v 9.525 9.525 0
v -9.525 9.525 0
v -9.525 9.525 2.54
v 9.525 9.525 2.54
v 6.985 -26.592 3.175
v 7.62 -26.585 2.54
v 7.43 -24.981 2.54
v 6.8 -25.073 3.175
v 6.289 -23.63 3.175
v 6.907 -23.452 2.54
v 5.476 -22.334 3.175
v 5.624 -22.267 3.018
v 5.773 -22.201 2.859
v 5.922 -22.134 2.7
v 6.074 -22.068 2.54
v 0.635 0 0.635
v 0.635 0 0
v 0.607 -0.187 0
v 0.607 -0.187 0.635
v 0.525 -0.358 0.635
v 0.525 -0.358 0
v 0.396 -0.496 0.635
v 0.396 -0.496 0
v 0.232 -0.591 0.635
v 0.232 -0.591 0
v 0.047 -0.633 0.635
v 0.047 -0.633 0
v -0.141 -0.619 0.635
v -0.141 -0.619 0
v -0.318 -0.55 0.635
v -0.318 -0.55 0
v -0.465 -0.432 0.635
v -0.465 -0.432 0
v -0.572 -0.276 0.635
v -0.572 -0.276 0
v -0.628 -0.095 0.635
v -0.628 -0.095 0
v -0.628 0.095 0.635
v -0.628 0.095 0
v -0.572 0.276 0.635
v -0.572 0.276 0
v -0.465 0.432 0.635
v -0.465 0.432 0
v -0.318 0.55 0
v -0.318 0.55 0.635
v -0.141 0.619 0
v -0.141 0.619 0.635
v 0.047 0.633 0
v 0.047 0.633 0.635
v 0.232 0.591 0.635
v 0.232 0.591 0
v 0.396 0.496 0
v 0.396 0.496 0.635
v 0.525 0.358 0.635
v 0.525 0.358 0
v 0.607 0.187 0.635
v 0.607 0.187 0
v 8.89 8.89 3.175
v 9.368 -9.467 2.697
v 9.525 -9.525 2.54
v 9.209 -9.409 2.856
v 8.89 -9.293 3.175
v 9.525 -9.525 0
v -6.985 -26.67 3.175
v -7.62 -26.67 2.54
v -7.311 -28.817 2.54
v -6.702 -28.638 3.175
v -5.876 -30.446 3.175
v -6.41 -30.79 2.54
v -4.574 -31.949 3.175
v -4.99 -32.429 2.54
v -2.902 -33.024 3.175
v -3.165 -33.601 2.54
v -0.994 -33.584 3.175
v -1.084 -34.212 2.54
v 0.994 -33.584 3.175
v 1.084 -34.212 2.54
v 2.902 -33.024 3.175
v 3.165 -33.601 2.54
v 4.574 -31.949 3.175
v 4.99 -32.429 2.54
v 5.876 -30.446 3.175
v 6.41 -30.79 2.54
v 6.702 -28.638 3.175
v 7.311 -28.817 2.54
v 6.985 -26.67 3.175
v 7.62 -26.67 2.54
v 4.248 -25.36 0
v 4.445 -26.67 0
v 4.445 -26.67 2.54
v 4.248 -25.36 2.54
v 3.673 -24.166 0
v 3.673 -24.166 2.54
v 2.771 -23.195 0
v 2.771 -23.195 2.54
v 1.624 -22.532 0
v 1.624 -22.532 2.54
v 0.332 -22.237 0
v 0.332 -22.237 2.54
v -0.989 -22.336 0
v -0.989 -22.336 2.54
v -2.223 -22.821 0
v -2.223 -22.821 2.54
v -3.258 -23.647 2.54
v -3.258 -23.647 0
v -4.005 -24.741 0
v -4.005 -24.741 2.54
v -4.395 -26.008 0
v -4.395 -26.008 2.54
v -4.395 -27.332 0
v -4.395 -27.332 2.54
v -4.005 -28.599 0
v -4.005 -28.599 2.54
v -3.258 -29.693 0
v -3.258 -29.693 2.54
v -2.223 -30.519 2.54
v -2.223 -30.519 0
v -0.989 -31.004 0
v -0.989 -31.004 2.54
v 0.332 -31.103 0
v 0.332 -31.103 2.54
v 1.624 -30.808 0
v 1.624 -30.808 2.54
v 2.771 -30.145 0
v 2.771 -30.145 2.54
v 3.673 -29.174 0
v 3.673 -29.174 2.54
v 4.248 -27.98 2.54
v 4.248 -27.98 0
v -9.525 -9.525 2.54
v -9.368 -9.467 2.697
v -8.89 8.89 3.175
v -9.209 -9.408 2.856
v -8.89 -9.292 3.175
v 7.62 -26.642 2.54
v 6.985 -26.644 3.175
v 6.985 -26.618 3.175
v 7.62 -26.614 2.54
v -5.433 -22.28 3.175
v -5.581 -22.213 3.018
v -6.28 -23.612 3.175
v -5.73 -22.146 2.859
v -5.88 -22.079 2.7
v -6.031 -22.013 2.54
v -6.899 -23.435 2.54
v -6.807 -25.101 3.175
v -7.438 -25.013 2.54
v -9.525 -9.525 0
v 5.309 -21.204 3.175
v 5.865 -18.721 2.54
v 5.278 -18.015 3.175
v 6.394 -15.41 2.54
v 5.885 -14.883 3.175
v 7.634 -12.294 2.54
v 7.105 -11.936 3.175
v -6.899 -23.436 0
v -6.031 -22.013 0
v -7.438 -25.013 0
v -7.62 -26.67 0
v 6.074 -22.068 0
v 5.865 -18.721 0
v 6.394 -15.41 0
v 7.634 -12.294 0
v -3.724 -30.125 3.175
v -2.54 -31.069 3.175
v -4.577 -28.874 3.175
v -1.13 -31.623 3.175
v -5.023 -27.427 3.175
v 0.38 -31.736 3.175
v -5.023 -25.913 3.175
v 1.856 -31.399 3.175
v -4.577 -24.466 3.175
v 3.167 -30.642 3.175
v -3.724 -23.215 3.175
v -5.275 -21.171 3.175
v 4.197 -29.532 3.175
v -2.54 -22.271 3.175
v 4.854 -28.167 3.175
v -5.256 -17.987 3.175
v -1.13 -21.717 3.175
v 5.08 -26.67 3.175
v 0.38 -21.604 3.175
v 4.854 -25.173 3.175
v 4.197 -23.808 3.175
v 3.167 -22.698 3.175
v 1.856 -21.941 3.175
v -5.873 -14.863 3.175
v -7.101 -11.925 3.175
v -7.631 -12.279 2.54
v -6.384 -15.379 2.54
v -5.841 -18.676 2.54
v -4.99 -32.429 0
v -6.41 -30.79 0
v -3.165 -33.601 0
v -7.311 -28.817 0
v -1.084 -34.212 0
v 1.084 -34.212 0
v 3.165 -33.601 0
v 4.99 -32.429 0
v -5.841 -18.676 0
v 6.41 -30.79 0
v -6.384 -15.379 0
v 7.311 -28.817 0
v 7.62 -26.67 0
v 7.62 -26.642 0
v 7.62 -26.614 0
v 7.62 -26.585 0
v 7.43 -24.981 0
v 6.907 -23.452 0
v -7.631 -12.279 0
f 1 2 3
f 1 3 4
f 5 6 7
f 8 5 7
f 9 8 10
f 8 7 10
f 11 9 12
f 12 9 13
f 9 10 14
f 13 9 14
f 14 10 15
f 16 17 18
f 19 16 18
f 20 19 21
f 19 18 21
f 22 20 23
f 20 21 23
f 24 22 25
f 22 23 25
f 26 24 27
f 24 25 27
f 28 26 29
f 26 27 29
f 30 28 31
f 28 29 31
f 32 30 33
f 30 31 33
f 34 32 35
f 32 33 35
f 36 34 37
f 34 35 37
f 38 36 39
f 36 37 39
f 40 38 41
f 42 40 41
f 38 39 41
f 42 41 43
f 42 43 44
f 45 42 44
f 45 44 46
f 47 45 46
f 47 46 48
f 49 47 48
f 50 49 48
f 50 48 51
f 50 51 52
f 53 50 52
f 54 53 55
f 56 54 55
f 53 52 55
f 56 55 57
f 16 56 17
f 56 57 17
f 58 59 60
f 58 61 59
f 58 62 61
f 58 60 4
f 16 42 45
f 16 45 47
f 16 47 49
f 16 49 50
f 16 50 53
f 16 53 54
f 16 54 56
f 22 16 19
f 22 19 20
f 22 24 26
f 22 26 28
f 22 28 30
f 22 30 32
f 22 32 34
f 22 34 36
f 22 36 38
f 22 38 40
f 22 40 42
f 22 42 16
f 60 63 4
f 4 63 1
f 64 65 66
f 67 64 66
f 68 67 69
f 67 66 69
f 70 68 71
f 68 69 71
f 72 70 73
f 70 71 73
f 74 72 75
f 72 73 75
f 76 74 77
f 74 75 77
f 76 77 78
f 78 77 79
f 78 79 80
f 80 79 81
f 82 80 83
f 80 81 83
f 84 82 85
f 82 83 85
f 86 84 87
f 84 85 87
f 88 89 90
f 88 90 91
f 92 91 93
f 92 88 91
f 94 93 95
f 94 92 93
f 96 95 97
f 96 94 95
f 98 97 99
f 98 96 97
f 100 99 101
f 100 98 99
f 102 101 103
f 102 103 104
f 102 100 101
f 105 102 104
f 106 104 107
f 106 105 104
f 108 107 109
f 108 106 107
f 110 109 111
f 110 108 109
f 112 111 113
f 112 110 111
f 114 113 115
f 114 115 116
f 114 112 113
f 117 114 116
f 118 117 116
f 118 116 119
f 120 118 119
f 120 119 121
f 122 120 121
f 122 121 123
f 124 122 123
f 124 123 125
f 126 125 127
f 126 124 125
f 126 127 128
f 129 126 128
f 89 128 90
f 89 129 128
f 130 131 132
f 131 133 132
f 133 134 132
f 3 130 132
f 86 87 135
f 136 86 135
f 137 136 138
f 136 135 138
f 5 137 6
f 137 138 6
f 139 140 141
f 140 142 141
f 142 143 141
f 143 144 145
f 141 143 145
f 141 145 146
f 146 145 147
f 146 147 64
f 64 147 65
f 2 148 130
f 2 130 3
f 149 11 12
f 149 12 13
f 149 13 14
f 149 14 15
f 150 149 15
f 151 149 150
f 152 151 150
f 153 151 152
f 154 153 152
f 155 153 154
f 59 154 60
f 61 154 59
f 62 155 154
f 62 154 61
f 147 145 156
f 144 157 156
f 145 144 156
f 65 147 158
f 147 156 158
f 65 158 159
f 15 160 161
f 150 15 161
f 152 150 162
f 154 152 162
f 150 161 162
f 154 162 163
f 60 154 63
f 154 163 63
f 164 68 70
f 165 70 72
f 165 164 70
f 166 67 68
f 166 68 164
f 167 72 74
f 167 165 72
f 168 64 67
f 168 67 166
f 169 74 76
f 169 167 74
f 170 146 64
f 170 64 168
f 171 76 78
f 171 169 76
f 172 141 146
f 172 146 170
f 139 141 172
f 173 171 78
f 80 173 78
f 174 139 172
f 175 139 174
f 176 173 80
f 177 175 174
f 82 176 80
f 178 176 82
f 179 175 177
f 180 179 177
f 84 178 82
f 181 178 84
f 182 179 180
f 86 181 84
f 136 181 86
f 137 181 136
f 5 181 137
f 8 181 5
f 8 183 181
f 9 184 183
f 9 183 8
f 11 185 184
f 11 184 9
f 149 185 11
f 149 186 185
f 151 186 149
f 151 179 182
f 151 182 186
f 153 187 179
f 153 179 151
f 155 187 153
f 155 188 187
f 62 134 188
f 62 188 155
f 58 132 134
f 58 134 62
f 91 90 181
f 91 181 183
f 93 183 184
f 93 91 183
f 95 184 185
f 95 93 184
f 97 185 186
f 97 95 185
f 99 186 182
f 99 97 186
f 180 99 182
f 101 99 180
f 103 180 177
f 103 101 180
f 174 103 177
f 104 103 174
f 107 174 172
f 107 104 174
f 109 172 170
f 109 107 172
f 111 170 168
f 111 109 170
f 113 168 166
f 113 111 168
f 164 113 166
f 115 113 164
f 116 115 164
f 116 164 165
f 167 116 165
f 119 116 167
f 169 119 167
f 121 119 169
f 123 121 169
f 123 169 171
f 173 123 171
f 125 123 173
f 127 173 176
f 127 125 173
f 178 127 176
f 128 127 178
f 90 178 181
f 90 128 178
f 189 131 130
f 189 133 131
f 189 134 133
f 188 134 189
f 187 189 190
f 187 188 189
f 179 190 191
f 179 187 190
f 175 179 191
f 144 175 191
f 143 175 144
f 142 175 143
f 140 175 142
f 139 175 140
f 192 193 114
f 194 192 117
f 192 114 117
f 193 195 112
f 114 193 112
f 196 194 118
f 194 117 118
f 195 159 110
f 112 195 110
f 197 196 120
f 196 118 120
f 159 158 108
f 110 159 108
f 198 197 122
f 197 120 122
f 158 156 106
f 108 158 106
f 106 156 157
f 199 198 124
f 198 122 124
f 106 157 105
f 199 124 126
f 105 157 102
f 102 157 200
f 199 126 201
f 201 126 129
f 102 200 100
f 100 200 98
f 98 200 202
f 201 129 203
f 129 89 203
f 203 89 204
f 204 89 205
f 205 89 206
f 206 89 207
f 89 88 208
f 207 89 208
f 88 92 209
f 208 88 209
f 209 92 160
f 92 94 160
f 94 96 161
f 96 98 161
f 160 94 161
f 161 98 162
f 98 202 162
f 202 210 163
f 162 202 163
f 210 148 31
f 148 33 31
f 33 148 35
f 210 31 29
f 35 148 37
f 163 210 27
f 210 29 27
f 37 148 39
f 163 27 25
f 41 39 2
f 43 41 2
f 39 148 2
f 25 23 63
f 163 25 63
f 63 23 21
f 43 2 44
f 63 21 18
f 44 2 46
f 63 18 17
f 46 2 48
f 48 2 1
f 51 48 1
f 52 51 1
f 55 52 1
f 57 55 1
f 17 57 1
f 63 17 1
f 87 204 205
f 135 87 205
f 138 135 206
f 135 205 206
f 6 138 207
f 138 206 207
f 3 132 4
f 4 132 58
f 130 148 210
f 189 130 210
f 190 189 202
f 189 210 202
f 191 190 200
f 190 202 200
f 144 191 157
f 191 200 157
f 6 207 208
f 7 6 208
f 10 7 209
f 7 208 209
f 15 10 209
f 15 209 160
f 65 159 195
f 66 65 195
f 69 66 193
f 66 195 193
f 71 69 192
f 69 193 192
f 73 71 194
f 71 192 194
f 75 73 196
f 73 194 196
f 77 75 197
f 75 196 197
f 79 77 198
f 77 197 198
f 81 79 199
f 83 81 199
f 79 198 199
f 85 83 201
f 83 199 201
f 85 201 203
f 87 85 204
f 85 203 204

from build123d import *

# Parameters (mm, degrees)
F0_W       = 19.05
F0_H       = 19.05
F0_R       = 4.445
F1_DEPTH   = 3.175
F2_C1_SIZE = 0.635
F2_C2_SIZE = 0.635
F2_C3_SIZE = 0.635
F2_C4_SIZE = 0.635
F2_C5_SIZE = 0.635
F2_C6_SIZE = 0.635
F2_C7_SIZE = 0.6349
F3_R       = 0.635
F4_DEPTH   = 0.635


# Not quite as in the source:
# - a fillet or chamfer is up to 0.001 mm smaller than in the source, because OpenCascade refuses the exact size


with BuildPart() as f1:
    # F0 (on Top) → F1 (new body)
    with BuildSketch(Plane.XY):
        Rectangle(F0_W, F0_H)
        with BuildLine():
            Line((9.525, -9.525), (-9.525, -9.525))
            ThreePointArc((-9.525, -9.525), (-6.3836187271, -15.3786997104), (-6.0310725347, -22.012687032))
            ThreePointArc((-6.0310725347, -22.012687032), (0.0350329382, -19.0500805324), (6.0736411029, -22.0683390224))
            ThreePointArc((6.0736411029, -22.0683390224), (6.3936440411, -15.409890989), (9.525, -9.525))
        make_face()
        with BuildLine():
            ThreePointArc((6.0736411029, -22.0683390224), (0.0350329382, -19.0500805324), (-6.0310725347, -22.012687032))
            ThreePointArc((-6.0310725347, -22.012687032), (-6.6363180101, -24.4058987838), (-7.62, -26.67))
            ThreePointArc((-7.62, -26.67), (0, -34.29), (7.62, -26.67))
            ThreePointArc((7.62, -26.67), (7.619882327, -26.6276523681), (7.6195293118, -26.5853060441))
            ThreePointArc((7.6195293118, -26.5853060441), (6.6686101992, -24.3877327559), (6.0736411029, -22.0683390224))
        make_face()
        with Locations((0, -26.67)):
            Circle(F0_R, mode=Mode.SUBTRACT)
        with BuildLine():
            ThreePointArc((-7.62, -26.67), (-6.6363180101, -24.4058987838), (-6.0310725347, -22.012687032))
            ThreePointArc((-6.0310725347, -22.012687032), (-7.2118365454, -24.2095501137), (-7.62, -26.67))
        make_face()
        with BuildLine():
            ThreePointArc((7.6195293118, -26.5853060441), (7.2094713239, -24.202628275), (6.0736411029, -22.0683390224))
            ThreePointArc((6.0736411029, -22.0683390224), (6.6686101992, -24.3877327559), (7.6195293118, -26.5853060441))
        make_face()
    extrude(amount=F1_DEPTH)

    # F2: chamfer of 0.635 on 7 edges, made by hand

    # F2_c1
    f2_c1_edges = [f1.edges().sort_by_distance(p)[0] for p in [
        (0, 9.525, 3.175),
    ]]
    chamfer(f2_c1_edges, length=F2_C1_SIZE)

    # F2_c2
    f2_c2_edges = [f1.edges().sort_by_distance(p)[0] for p in [
        (-9.525, -0.3175, 3.175),
    ]]
    chamfer(f2_c2_edges, length=F2_C2_SIZE)

    # F2_c3
    f2_c3_edges = [f1.edges().sort_by_distance(p)[0] for p in [
        (-6.2554888364, -15.867774564, 3.175),
    ]]
    chamfer(f2_c3_edges, length=F2_C3_SIZE)

    # F2_c4
    f2_c4_edges = [f1.edges().sort_by_distance(p)[0] for p in [
        (6.3936440411, -15.409890989, 3.175),
    ]]
    chamfer(f2_c4_edges, length=F2_C4_SIZE)

    # F2_c5
    f2_c5_edges = [f1.edges().sort_by_distance(p)[0] for p in [
        (9.525, 0.1573240758, 3.175),
    ]]
    chamfer(f2_c5_edges, length=F2_C5_SIZE)

    # F2_c6
    f2_c6_edges = [f1.edges().sort_by_distance(p)[0] for p in [
        (-4.445, -26.67, 3.175),
    ]]
    chamfer(f2_c6_edges, length=F2_C6_SIZE)

    # F2_c7 (size 0.635 in the source; OpenCascade refuses exactly that, so slightly less here)
    f2_c7_edges = [f1.edges().sort_by_distance(p)[0] for p in [
        (-0.0350329382, -34.2899194676, 3.175),
    ]]
    chamfer(f2_c7_edges, length=F2_C7_SIZE)

    # F3 (on face) → F4 (cut)
    with BuildSketch(Plane(origin=(0, 0, 0), x_dir=(1, 0, 0), z_dir=(0, 0, -1))):
        Circle(F3_R)
    extrude(amount=-F4_DEPTH, mode=Mode.SUBTRACT)


solid = f1.part
